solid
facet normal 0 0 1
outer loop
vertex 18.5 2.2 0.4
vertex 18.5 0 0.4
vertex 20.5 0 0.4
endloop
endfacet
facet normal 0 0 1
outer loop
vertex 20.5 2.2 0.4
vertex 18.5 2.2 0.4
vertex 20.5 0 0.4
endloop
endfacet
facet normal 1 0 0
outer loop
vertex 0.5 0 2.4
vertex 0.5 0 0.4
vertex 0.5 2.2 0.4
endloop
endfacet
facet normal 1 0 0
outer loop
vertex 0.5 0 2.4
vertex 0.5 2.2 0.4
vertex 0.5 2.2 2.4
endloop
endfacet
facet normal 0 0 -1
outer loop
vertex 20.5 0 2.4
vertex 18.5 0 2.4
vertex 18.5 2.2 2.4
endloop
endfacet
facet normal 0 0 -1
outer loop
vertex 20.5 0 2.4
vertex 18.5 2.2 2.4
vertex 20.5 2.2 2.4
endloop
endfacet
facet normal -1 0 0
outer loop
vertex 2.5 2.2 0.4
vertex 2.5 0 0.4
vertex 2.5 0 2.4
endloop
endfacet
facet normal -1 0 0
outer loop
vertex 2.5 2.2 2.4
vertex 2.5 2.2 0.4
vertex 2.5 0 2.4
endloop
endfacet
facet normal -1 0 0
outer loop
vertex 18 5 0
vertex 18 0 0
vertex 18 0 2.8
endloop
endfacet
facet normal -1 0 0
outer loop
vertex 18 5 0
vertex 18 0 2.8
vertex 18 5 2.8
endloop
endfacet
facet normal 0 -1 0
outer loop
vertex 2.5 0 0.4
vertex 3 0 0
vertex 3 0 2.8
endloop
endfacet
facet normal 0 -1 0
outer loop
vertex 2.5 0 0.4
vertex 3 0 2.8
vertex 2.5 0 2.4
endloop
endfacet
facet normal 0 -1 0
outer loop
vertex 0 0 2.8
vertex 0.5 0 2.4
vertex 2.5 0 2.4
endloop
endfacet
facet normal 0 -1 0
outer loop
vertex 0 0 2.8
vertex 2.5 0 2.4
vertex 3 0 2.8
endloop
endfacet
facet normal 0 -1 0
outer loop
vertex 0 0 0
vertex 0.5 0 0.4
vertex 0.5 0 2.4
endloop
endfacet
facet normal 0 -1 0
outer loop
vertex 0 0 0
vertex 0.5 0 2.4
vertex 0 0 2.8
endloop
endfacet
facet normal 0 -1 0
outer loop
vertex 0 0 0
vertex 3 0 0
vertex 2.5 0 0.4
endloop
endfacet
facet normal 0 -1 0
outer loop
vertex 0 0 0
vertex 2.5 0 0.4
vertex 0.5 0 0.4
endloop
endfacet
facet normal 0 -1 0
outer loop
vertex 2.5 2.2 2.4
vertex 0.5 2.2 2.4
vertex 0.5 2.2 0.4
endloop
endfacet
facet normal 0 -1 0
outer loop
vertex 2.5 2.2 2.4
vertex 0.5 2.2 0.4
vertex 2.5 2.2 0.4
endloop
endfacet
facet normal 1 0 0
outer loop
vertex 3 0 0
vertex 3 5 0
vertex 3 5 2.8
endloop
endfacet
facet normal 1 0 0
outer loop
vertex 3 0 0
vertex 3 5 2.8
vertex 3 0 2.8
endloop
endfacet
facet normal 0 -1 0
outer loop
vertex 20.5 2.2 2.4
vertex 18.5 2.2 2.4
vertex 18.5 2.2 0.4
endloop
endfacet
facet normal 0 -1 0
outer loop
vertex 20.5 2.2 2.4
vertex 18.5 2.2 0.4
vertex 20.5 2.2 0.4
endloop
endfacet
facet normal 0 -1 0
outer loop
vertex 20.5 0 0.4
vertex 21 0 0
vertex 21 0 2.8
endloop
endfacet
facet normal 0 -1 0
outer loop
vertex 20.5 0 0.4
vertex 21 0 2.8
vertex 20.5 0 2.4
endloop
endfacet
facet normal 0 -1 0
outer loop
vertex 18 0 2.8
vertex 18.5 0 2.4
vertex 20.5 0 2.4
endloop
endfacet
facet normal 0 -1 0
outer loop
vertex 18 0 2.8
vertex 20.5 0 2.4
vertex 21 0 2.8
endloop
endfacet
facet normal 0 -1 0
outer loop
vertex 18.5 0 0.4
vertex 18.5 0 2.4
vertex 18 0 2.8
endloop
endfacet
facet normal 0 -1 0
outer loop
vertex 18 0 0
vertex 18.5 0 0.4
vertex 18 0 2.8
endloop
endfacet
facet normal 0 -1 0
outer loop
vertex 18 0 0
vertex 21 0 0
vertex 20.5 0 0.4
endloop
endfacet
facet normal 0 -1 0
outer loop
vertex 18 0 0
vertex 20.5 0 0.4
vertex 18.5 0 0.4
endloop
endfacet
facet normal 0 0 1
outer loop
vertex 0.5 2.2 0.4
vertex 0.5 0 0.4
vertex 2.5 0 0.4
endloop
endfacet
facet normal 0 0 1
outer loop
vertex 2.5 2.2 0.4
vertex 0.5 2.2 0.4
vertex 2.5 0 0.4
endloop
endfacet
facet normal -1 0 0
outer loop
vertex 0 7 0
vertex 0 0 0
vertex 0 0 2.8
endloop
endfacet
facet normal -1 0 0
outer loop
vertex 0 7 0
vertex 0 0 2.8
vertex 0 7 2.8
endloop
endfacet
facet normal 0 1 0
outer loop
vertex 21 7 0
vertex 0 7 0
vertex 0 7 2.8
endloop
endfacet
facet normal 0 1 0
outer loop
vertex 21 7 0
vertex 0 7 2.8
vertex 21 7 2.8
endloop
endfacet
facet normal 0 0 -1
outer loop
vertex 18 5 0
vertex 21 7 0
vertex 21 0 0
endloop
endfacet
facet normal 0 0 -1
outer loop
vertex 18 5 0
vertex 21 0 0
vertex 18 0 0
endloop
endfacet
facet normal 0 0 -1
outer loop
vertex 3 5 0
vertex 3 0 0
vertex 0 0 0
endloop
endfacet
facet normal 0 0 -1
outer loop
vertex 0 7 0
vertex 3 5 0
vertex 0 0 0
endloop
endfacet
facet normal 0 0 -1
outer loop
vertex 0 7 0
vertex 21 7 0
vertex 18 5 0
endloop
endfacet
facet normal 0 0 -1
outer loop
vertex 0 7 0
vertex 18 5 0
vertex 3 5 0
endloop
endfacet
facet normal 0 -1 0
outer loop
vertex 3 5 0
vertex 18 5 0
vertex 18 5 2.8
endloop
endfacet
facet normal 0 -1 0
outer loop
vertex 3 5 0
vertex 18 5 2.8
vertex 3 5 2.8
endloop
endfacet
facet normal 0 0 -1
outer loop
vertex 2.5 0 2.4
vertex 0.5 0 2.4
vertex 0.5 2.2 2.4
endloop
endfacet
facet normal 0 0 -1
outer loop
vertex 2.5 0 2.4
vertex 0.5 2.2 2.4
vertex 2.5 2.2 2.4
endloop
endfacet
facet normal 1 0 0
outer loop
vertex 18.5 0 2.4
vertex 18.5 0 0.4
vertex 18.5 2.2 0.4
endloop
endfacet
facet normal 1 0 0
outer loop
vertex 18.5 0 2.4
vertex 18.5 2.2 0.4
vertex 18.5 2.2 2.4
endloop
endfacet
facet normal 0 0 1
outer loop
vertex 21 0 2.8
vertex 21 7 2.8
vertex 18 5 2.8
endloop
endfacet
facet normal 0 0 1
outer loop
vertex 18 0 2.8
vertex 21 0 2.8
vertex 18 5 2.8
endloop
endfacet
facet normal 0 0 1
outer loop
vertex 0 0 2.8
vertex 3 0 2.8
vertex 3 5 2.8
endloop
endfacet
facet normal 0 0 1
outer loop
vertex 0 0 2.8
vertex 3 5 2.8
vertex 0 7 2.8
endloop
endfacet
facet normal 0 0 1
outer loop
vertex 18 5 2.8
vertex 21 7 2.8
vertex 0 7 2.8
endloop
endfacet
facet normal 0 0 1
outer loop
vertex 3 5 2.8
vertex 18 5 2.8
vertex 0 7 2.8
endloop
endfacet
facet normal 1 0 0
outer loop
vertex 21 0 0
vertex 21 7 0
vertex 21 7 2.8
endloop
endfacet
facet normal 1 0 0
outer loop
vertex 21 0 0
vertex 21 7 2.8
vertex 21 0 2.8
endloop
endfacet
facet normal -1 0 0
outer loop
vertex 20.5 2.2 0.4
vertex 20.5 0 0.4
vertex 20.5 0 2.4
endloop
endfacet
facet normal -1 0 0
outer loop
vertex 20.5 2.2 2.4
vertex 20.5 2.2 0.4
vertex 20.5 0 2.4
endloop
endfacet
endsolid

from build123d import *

# Parameters (mm, degrees)
BOSS_EXTRUDE1_DEPTH = 2.8
SKETCH2_W           = 2
SKETCH2_H           = 2
CUT_EXTRUDE1_DEPTH  = 2.2


with BuildPart() as part:
    # Sketch1 → Boss-Extrude1 (new body)
    with BuildSketch(Plane.XY):
        Polygon((0, 0), (0, 7), (21, 7), (21, 0), (18, 0), (18, 5), (3, 5), (3, 0), align=None)
    extrude(amount=BOSS_EXTRUDE1_DEPTH)

    # Sketch2 → Cut-Extrude1 (cut)
    with BuildSketch(Plane.XZ):
        with Locations((19.5, 1.4)):
            Rectangle(SKETCH2_W, SKETCH2_H)
        with Locations((1.5, 1.4)):
            Rectangle(SKETCH2_W, SKETCH2_H)
    extrude(amount=-CUT_EXTRUDE1_DEPTH, mode=Mode.SUBTRACT)


solid = part.part
